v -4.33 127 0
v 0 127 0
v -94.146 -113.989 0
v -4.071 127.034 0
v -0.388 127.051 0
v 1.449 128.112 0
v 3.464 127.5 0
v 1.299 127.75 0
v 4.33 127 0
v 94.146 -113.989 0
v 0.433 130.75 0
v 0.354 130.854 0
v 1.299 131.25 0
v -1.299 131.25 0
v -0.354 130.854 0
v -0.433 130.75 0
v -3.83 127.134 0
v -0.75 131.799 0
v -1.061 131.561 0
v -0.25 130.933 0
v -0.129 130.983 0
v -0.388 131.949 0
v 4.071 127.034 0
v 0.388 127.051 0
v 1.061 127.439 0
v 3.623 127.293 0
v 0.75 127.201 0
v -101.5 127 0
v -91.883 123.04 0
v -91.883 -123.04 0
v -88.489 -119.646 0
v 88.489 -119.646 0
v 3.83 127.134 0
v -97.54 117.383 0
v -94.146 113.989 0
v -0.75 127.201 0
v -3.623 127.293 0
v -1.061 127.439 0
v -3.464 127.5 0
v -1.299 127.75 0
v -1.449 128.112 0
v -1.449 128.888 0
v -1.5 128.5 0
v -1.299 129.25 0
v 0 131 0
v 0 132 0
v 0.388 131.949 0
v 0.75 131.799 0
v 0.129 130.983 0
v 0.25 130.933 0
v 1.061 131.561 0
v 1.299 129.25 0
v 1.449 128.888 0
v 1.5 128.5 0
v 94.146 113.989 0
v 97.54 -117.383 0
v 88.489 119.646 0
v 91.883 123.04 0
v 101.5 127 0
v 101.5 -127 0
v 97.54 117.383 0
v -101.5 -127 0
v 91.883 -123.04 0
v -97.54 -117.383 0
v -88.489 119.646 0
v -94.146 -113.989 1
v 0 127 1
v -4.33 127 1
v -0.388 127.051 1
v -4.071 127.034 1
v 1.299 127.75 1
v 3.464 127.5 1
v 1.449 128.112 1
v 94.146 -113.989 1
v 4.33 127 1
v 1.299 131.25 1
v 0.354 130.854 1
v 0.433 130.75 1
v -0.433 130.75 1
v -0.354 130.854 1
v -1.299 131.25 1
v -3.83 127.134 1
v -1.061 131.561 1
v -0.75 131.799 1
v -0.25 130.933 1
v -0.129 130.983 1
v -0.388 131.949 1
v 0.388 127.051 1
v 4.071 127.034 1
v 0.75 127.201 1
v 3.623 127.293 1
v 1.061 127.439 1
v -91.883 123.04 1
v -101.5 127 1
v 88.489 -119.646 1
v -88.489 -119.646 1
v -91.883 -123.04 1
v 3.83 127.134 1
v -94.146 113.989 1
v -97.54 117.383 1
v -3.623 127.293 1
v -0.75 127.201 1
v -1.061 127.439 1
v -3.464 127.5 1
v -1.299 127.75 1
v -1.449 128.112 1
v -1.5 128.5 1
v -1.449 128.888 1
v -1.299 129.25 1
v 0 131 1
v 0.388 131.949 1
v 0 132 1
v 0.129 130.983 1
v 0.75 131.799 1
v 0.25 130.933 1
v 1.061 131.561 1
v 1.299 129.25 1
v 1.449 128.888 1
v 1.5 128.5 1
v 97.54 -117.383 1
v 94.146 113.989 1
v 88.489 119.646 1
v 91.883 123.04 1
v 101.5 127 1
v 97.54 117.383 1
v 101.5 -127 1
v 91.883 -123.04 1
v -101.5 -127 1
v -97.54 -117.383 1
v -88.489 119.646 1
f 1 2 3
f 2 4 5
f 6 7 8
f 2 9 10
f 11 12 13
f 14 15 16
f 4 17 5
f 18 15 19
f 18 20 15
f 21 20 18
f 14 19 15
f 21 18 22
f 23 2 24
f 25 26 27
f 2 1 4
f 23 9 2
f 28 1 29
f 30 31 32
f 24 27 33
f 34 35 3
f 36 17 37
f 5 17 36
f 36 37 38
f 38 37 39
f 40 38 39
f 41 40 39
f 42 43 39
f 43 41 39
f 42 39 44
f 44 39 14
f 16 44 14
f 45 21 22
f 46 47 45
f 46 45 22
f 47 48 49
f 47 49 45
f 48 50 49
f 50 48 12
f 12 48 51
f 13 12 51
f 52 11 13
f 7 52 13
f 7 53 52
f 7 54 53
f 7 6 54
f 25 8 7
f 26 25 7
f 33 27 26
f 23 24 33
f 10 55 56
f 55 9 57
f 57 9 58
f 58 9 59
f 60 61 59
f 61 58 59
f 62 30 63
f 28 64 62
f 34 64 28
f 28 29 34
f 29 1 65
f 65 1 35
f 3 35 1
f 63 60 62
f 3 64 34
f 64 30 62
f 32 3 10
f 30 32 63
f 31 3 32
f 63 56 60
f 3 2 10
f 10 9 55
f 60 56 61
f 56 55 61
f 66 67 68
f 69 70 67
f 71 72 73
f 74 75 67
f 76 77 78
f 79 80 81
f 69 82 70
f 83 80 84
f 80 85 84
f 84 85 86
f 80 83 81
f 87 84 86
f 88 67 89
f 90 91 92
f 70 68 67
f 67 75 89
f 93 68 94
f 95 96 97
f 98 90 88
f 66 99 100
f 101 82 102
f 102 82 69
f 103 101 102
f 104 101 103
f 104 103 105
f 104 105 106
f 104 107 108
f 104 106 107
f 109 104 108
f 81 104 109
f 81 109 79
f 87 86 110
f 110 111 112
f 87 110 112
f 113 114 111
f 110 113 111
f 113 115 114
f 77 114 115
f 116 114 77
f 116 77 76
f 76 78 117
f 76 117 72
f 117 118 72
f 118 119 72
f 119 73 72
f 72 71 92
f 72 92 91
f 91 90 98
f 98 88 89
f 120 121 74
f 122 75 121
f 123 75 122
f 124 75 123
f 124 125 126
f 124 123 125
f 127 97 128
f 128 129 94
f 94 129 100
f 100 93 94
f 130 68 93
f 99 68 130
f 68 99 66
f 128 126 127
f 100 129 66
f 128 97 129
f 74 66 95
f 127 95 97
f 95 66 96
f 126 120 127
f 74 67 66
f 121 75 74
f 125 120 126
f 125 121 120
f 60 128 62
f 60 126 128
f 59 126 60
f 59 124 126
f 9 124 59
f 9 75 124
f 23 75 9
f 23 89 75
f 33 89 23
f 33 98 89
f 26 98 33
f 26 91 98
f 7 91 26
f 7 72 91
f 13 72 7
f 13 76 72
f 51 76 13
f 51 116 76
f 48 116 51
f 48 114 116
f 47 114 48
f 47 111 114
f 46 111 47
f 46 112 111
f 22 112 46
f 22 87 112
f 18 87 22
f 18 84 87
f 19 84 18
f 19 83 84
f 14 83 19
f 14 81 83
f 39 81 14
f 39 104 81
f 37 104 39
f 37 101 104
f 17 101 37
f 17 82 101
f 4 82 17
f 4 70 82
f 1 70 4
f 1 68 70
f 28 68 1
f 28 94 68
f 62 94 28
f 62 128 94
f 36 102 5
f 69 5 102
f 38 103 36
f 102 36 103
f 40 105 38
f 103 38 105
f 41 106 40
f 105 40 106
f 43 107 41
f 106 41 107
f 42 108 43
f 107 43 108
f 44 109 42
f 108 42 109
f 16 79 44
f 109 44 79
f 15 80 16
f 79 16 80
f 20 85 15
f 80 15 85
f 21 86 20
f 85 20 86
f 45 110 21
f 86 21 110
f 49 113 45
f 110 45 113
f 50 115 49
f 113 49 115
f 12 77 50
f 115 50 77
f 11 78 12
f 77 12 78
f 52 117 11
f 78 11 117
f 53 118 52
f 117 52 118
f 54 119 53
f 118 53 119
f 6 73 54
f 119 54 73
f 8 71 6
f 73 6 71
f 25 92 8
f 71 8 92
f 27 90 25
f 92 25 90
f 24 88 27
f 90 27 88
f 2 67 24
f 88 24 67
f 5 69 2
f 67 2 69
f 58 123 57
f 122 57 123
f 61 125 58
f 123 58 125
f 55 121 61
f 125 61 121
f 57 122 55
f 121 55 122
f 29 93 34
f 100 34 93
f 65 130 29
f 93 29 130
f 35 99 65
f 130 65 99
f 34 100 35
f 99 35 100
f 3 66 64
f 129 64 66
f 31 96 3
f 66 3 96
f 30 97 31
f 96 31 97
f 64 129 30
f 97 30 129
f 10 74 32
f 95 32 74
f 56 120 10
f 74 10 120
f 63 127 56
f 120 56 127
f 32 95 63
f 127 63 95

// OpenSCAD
// Customizable photo frame
// by Stellar Innovation
// http://www.thingiverse.com/stellarinnovation/about
// licensed under the Creative Commons - Attribution license. 
//
// Consists of three different parts:
// * Back of frame, with hanger
// * Front of frame (no hanger)
// * Clip, you need four clips, which fit in the holes at the corners of
//   the front/back parts
//
// The front and back don't make sense to 3D print. It's intended to laser cut them instead.
//
// First revision 19 October 2017
// Second rev.  20 October 2017, fixes in module Hanger2D

part = 1; // [1:Back, 2:Front, 3:Clips]
frame_width = 203;  // [50:500]
frame_height = 254;  // [50:500]

clip_gap = 6.2;            // [3:0.1:10]
clip_thickness = 2;        // [2:0.1:4]
hole_width = 8;      // [6:0.1:16]
peg_depth = 1.5;     // [1:0.1:1.5]

hanger_big_diam = 3; // [2:0.1:6]
hanger_small_diam = 1; // [0.5:0.1:3]
hanger_thickness = 1; // [1:0.1:5]

hole_distance = 0.8*hole_width;
hole_length = 0.6*hole_width; // hole dimension, radius of "peg" 

if (part==1)
  linear_extrude(height=1)
    BackOfFrame2D();  
else if (part==2)
  linear_extrude(height=1)
    FrontOfFrame2D();
else
  FourClips();


// Export this one as an SVG file or "flatten" the STL into 2D for laser cutting
module BackOfFrame2D() {
  // Back looks basically the same as the front
  FrontOfFrame2D();
  
  // ...plus a hanger
  translate([0, frame_height/2])
    Hanger2D();
}

// Export this one as an SVG file or "flatten" the STL into 2D for laser cutting
module FrontOfFrame2D() {
  difference() {
    // The actual frame
    square([frame_width, frame_height], center=true);
    
    // The four holes in the corners
    x = frame_width/2 - (hole_distance + hole_width)/sqrt(2);
    y = frame_height/2 - (hole_distance + hole_width)/sqrt(2);
    for (i=[0:3]) {
      angle = 90*i+45;             // 45, 135,...
      dx = (i-1.5)*(i-1.5) - 1.25;   // +1, -1, -1, +1 direction vector
      dy = sign(1.5-i);             // +1, +1, -1, -1
      translate([x*dx, y*dy])
        rotate(angle)
          translate([0, -hole_width/2])
            square([hole_length, hole_width]);
    }
  }
}

module Hanger2D() {
  // The hanger is shaped as a triangle with rounded corners
  // and two holes inside. The hole is constructed from two circles:
  // a big one for the head of a nail,  and a small hole on top, 
  // where the frame hangs from the nail itself  
  c = sqrt(3)/2; // cos 30
  s = 0.5;       // sin 30
  R = max(hanger_big_diam, hanger_small_diam)/2;
  height = 3*R + 2*hanger_thickness;
  base = 2*height/sqrt(3);
  
  // center of small hole
  y0 = height - hanger_small_diam - 2*hanger_thickness;
  // tangent, where the rounded corner ends
  r1 = hanger_small_diam/2 + hanger_thickness;
  x1 = r1*c;
  y1 = y0 + r1*s;
  
  // tangent, small hole
  x2 = c*hanger_small_diam/2;
  y2 = y0 + s*hanger_small_diam/2;
  
  // tangent, big hole
  x3 = c*R;
  y3 = (1+s)*R;
  
  dRadius = 1/tan(60);
  echo(dRadius);
  difference() {
    union() {
      // rounded top
      translate([0, y0])
        circle(r=r1, $fn=24);
      // rest of the triangle
      polygon([[x1, y1], [base/2, 0], [-base/2, 0], [-x1, y1]]);
      // a piece to cut out a 1mm radius at the base
      translate([-base/2-dRadius, 0])
        square([base+2*dRadius, s]);
    }
    // Small circular hole
    translate([0, y0])
      circle(d=hanger_small_diam, $fn=24);
    // Big circular hole
    translate([0, R])
      circle(r=R, $fn=24);
    // rest of the hole
    polygon([[x2, y2], [x3,y3], [-x3,y3], [-x2,y2]]);
    
    // Fillets
    translate([-base/2-dRadius, 1])
      circle(r=1, $fn=24);
    translate([base/2+dRadius, 1])
      circle(r=1, $fn=24);
  }
}

// Four identical clips
module FourClips() {
  and_some = 1;
  
  // Space the four clips, rotated around the Origin
  for (a=[0:90:270])
    rotate(a)
      translate([0, (clip_gap + 2*clip_thickness)/1.4 + and_some])
        Clip();
}

module Clip() {
  // two "legs"
  Leg();
  mirror([1, 0, 0])
    Leg();
  // and a round "joint"
  Joint();
}

module Joint() {
  tol = 0.2;

  height = 2*clip_thickness + clip_gap;
  difference() {
    // Outer cylinder
    w = hole_width - 2*tol;
    cylinder(d=height, h=w, $fn=32);

    // takes away half of the cylinder
    translate([-height/2, 0])
      cube([height, height, hole_width]);
    
    // takes away center (rounds it off)
    cylinder(d=clip_gap, h=hole_width, $fn=24);  
    
    // a slot to make it more flexible
    translate([0, -0.1*height, 0.4*w])
      scale([clip_gap, height])
        cylinder(d=1, h=0.2*w, $fn=24);
  }
}

module Leg() {
  tol = 0.2;

  w = hole_width - 2*tol;
  d = hole_distance + hole_length/2 + tol;
  r = hole_length/2 - tol;

  translate([clip_gap/2, 0]) {  
    cube([clip_thickness, d, w]);
    translate([clip_thickness, d])
      scale([(peg_depth+clip_thickness)/2/r, 1, 1])
        translate([-r, 0])
          cylinder(r=r, h=w, $fn=16);
  }
}
